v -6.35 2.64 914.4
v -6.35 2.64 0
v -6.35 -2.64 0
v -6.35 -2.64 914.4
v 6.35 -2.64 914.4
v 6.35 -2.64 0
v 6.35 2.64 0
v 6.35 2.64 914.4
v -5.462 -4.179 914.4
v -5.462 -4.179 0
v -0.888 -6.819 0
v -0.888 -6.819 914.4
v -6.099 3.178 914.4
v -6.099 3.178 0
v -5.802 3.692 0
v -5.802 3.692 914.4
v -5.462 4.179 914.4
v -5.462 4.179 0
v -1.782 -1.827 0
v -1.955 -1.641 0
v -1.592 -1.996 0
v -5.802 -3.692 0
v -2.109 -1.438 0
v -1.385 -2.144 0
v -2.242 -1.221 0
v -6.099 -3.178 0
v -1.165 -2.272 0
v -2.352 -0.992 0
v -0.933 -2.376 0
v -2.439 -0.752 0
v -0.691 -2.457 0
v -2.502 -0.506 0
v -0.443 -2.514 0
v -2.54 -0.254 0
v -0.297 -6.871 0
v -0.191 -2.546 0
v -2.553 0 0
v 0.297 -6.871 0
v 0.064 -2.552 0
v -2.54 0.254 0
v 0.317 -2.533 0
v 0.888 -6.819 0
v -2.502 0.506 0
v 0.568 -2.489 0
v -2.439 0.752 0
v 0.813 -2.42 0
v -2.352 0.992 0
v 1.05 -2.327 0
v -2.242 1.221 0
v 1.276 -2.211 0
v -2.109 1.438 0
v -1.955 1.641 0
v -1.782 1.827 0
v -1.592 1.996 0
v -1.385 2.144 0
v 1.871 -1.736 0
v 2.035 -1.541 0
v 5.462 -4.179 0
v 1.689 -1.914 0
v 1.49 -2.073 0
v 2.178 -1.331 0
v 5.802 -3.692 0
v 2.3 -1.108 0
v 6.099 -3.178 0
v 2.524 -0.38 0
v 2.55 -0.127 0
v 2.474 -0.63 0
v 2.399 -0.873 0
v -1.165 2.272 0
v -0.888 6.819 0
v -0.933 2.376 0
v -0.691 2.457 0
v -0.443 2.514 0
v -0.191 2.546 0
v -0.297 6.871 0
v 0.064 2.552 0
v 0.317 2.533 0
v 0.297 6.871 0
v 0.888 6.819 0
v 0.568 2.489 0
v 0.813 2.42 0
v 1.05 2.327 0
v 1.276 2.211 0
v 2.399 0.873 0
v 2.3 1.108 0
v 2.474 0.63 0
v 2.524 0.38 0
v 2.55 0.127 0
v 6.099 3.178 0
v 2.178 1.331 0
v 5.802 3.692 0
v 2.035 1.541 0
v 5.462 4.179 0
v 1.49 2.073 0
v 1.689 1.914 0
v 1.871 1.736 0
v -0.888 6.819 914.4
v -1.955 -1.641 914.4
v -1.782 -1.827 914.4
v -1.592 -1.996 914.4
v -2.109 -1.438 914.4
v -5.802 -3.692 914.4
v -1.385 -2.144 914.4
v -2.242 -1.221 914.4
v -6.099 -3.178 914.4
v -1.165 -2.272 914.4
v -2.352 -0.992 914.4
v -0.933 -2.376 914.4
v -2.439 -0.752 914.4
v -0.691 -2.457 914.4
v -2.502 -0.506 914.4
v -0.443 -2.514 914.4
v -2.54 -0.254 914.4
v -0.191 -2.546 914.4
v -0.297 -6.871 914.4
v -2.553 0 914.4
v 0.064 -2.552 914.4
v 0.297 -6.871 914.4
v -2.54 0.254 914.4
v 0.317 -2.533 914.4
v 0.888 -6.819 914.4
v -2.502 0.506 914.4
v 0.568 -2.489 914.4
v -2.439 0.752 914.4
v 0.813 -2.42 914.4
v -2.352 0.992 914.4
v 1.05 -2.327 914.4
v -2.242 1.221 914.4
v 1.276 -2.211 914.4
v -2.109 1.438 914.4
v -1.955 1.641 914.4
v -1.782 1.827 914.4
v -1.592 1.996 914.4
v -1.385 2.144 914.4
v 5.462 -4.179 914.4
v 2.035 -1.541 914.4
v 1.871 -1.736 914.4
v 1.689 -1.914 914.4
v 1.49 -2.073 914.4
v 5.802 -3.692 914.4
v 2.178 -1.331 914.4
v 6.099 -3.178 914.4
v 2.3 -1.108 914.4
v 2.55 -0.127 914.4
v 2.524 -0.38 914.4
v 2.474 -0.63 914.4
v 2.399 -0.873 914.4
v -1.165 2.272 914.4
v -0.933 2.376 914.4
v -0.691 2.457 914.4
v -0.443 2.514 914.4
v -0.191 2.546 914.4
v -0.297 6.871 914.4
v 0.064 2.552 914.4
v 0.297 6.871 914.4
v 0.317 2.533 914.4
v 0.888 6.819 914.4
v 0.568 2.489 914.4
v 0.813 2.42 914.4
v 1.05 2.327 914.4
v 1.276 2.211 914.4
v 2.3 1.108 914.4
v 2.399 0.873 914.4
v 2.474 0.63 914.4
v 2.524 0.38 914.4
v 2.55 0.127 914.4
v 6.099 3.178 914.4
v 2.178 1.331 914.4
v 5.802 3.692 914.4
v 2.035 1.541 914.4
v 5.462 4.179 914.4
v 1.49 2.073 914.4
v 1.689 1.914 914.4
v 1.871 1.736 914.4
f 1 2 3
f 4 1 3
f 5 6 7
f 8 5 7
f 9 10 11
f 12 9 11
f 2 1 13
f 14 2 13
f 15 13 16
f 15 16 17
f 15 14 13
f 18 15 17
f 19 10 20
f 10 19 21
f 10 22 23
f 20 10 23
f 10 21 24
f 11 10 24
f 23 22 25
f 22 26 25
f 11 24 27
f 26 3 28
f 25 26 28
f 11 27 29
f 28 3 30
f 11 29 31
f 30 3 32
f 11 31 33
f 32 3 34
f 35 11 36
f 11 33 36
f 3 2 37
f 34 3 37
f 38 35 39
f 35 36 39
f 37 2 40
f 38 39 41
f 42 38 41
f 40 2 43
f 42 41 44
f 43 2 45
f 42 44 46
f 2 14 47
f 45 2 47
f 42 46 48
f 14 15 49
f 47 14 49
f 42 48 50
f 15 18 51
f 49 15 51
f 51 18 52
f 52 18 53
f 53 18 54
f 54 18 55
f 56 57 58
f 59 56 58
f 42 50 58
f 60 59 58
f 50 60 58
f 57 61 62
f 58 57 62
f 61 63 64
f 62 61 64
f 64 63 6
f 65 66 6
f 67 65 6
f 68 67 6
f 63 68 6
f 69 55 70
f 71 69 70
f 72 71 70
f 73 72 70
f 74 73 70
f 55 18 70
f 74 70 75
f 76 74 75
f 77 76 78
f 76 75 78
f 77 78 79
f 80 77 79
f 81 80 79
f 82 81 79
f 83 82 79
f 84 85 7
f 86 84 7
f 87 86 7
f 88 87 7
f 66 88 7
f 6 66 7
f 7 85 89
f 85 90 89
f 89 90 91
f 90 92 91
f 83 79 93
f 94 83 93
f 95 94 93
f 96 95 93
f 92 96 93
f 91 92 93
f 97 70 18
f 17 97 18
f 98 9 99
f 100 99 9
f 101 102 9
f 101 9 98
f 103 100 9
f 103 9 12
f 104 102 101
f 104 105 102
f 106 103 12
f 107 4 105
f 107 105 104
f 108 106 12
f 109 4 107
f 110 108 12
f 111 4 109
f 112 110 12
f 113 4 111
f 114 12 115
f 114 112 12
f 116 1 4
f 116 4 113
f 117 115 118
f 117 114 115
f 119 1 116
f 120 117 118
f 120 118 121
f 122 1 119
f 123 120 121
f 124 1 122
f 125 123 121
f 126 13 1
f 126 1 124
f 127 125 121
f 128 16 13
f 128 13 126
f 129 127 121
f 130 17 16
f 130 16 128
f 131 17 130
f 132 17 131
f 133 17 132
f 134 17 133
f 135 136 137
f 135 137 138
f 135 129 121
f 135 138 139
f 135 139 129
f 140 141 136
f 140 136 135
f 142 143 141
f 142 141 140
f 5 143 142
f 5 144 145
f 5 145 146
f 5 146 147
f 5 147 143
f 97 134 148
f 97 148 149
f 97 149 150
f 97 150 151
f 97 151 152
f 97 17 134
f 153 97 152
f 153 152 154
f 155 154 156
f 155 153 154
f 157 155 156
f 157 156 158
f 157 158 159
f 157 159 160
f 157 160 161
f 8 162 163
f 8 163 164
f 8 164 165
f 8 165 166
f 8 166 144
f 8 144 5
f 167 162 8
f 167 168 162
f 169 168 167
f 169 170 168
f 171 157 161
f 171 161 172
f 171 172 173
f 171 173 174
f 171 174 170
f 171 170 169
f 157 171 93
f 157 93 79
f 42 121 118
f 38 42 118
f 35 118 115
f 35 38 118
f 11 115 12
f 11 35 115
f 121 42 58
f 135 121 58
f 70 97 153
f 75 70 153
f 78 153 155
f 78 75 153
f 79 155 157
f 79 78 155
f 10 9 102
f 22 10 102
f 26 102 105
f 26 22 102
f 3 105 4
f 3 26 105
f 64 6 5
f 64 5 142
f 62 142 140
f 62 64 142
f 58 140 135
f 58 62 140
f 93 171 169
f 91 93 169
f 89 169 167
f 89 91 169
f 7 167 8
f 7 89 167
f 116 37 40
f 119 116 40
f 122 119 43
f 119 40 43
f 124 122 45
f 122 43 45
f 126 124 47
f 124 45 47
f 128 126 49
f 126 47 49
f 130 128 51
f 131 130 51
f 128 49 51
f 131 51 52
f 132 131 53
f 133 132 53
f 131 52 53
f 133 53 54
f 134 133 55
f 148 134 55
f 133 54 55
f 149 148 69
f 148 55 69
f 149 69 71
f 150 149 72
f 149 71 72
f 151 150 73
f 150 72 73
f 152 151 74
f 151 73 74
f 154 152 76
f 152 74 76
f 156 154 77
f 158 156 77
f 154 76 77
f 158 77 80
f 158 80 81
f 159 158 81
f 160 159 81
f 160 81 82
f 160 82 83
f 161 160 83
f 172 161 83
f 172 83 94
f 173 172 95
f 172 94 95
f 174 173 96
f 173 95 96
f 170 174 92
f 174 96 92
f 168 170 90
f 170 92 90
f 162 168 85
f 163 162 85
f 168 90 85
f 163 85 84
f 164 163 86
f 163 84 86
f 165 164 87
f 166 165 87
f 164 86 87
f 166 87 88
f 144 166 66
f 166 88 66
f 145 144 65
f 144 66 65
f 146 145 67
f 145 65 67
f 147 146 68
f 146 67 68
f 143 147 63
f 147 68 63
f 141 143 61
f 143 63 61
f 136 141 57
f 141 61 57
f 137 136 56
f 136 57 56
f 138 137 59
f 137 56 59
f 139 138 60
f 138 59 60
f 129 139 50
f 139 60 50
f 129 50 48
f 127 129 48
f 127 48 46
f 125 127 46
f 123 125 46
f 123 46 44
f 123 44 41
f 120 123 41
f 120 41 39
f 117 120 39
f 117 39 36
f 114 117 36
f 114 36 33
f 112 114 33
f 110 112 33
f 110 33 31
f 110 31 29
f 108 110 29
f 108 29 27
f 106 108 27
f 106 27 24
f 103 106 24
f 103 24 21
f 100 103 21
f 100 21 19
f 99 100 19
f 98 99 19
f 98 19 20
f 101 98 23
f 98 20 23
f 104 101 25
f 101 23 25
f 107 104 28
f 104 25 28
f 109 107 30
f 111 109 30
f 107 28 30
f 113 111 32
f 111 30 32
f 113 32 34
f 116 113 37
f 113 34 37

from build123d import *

# Parameters (mm, degrees)
SHAFT_BOSS_DEPTH                = 914.4
SKETCH2_R                       = 9.41705
SKETCH2_R_2                     = 6.87705
CUT_FOR_THUNDER_HEX_ROUND_DEPTH = 914.4
SKETCH3_R                       = 2.5527
CENTER_HOLE_CUT_DEPTH           = 914.4


with BuildPart() as part:
    # Sketch1 → Shaft Boss (new body)
    with BuildSketch(Plane.XY):
        Polygon((0, 7.332348419), (-6.35, 3.666174209), (-6.35, -3.666174209), (0, -7.332348419), (6.35, -3.666174209), (6.35, 3.666174209), align=None)
    extrude(amount=SHAFT_BOSS_DEPTH)

    # Sketch2 → Cut For Thunder Hex Round (cut)
    with BuildSketch(Plane(origin=(0, 0, 0), x_dir=(-1, 0, 0), z_dir=(0, 0, -1))):
        Circle(SKETCH2_R)
        Circle(SKETCH2_R_2, mode=Mode.SUBTRACT)
    extrude(amount=-CUT_FOR_THUNDER_HEX_ROUND_DEPTH, mode=Mode.SUBTRACT)

    # Sketch3 → Center Hole Cut (cut)
    with BuildSketch(Plane(origin=(0, 0, 0), x_dir=(-1, 0, 0), z_dir=(0, 0, -1))):
        Circle(SKETCH3_R)
    extrude(amount=-CENTER_HOLE_CUT_DEPTH, mode=Mode.SUBTRACT)


solid = part.part
